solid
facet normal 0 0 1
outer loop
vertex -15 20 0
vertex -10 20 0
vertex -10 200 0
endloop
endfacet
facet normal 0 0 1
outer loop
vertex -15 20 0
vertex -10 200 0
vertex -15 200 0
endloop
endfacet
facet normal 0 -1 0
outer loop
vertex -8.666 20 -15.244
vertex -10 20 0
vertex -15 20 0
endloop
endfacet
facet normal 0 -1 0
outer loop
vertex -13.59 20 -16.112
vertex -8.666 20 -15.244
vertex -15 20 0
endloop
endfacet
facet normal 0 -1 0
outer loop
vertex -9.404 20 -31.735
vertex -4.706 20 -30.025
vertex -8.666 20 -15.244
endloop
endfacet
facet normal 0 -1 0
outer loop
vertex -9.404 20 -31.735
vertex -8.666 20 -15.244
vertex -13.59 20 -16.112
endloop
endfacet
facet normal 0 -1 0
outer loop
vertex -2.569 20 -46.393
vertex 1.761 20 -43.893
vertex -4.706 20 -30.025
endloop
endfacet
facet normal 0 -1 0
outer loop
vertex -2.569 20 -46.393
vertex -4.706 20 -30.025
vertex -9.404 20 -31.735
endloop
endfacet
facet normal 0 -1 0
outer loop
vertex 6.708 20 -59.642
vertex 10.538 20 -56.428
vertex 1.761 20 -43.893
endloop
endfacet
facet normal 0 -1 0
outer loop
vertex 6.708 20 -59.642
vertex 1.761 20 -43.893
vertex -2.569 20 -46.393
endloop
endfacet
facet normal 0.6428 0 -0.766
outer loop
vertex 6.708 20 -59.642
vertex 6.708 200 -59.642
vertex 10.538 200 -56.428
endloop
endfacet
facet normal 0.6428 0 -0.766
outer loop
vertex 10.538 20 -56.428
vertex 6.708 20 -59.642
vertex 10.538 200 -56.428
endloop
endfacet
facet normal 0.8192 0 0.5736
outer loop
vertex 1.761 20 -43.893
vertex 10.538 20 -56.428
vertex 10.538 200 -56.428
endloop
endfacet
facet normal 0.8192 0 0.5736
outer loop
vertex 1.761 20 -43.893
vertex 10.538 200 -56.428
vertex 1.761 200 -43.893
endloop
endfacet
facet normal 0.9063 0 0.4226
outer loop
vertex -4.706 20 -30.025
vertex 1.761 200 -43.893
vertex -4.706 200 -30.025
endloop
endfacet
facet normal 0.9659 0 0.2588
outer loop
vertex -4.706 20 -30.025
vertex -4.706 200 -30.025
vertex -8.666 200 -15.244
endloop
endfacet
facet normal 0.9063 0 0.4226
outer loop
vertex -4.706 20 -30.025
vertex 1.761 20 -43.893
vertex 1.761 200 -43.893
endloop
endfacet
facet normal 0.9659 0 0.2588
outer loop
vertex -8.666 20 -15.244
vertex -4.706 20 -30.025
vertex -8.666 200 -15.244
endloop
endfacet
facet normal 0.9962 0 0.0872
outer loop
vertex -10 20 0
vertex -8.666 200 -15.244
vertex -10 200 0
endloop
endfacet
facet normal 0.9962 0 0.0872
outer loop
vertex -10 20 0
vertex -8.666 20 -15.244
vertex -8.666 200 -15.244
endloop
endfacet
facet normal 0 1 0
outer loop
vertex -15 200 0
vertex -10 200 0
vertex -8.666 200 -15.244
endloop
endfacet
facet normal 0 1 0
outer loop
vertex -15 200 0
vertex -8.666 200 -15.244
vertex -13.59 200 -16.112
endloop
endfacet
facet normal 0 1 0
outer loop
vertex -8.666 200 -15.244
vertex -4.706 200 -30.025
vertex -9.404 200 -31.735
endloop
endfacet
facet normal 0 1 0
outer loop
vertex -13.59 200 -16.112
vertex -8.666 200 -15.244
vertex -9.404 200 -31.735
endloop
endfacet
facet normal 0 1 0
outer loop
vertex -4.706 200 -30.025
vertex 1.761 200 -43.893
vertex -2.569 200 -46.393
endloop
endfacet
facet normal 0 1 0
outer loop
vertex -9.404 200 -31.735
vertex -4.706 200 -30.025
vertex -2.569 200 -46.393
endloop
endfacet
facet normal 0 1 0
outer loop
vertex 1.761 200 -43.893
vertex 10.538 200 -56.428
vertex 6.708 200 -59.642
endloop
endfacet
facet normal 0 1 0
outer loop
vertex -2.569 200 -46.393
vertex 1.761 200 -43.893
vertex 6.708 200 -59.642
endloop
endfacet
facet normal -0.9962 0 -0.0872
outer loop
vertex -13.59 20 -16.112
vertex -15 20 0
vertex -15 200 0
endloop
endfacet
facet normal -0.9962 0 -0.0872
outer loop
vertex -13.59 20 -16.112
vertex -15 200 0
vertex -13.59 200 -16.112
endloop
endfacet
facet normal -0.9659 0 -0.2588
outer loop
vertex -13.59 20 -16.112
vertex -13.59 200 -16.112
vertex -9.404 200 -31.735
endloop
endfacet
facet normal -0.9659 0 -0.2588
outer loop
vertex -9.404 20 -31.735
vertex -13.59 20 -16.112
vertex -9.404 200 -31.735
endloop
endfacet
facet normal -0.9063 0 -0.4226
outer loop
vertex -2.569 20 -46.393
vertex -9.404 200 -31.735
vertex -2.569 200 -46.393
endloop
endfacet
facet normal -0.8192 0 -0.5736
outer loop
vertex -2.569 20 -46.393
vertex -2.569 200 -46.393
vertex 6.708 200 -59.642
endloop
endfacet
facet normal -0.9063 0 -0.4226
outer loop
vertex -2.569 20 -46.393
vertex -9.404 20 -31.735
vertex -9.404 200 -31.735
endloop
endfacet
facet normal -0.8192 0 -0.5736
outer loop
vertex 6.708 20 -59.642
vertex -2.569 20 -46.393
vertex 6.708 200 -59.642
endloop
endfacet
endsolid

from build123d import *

# Parameters (mm, degrees)
SKETCH1_R           = 2.6
BOSS_EXTRUDE1_DEPTH = 20
BOSS_EXTRUDE2_DEPTH = 180
CUT_EXTRUDE1_DEPTH  = 192.378764777


with BuildPart() as part:
    # Sketch1 → Boss-Extrude1 (new body)
    with BuildSketch(Plane(origin=(0, 0, 0), x_dir=(1, 0, 0), z_dir=(0, 1, 0))):
        with BuildLine():
            Line((10, 0), (-10, 0))
            ThreePointArc((-10, 0), (-4.705844869, 30.024645745), (10.538067282, 56.427876097))
            Line((10.538067282, 56.427876097), (25.858956145, 43.572123903))
            ThreePointArc((25.858956145, 43.572123903), (14.088007547, 23.184242879), (10, 0))
        make_face()
        with Locations(Location((0.645465629, 10, 0), (0, 0, 270))):
            Circle(SKETCH1_R, mode=Mode.SUBTRACT)
        with Locations(Location((4.691081339, 26.604444312, 0), (0, 0, 270))):
            Circle(SKETCH1_R, mode=Mode.SUBTRACT)
        with Locations(Location((12.265090975, 41.92465826, 0), (0, 0, 270))):
            Circle(SKETCH1_R, mode=Mode.SUBTRACT)
    extrude(amount=BOSS_EXTRUDE1_DEPTH)

    # Sketch3 → Cut-Extrude1 (cut, through all)
    with BuildSketch(Plane(origin=(0, 20, 0), x_dir=(1, 0, 0), z_dir=(0, 1, 0))):
        with BuildLine():
            Line((25.858956145, 43.572123903), (10.538067282, 56.427876097))
            ThreePointArc((10.538067282, 56.427876097), (-4.705844869, 30.024645745), (-10, 0))
            Line((-10, 0), (10, 0))
            ThreePointArc((10, 0), (14.088007547, 23.184242879), (25.858956145, 43.572123903))
        make_face()
    extrude(amount=-CUT_EXTRUDE1_DEPTH, mode=Mode.SUBTRACT)


with BuildPart() as body_2:
    # Sketch2 → Boss-Extrude2 (new body)
    with BuildSketch(Plane(origin=(0, 20, 0), x_dir=(1, 0, 0), z_dir=(0, 1, 0))):
        with BuildLine():
            Line((6.707845067, 59.641814145), (10.538067282, 56.427876097))
            ThreePointArc((10.538067282, 56.427876097), (-4.705844869, 30.024645745), (-10, 0))
            Line((-10, 0), (-15, 0))
            ThreePointArc((-15, 0), (-9.404307973, 31.734746462), (6.707845067, 59.641814145))
        make_face()
    extrude(amount=BOSS_EXTRUDE2_DEPTH)


solid = body_2.part
